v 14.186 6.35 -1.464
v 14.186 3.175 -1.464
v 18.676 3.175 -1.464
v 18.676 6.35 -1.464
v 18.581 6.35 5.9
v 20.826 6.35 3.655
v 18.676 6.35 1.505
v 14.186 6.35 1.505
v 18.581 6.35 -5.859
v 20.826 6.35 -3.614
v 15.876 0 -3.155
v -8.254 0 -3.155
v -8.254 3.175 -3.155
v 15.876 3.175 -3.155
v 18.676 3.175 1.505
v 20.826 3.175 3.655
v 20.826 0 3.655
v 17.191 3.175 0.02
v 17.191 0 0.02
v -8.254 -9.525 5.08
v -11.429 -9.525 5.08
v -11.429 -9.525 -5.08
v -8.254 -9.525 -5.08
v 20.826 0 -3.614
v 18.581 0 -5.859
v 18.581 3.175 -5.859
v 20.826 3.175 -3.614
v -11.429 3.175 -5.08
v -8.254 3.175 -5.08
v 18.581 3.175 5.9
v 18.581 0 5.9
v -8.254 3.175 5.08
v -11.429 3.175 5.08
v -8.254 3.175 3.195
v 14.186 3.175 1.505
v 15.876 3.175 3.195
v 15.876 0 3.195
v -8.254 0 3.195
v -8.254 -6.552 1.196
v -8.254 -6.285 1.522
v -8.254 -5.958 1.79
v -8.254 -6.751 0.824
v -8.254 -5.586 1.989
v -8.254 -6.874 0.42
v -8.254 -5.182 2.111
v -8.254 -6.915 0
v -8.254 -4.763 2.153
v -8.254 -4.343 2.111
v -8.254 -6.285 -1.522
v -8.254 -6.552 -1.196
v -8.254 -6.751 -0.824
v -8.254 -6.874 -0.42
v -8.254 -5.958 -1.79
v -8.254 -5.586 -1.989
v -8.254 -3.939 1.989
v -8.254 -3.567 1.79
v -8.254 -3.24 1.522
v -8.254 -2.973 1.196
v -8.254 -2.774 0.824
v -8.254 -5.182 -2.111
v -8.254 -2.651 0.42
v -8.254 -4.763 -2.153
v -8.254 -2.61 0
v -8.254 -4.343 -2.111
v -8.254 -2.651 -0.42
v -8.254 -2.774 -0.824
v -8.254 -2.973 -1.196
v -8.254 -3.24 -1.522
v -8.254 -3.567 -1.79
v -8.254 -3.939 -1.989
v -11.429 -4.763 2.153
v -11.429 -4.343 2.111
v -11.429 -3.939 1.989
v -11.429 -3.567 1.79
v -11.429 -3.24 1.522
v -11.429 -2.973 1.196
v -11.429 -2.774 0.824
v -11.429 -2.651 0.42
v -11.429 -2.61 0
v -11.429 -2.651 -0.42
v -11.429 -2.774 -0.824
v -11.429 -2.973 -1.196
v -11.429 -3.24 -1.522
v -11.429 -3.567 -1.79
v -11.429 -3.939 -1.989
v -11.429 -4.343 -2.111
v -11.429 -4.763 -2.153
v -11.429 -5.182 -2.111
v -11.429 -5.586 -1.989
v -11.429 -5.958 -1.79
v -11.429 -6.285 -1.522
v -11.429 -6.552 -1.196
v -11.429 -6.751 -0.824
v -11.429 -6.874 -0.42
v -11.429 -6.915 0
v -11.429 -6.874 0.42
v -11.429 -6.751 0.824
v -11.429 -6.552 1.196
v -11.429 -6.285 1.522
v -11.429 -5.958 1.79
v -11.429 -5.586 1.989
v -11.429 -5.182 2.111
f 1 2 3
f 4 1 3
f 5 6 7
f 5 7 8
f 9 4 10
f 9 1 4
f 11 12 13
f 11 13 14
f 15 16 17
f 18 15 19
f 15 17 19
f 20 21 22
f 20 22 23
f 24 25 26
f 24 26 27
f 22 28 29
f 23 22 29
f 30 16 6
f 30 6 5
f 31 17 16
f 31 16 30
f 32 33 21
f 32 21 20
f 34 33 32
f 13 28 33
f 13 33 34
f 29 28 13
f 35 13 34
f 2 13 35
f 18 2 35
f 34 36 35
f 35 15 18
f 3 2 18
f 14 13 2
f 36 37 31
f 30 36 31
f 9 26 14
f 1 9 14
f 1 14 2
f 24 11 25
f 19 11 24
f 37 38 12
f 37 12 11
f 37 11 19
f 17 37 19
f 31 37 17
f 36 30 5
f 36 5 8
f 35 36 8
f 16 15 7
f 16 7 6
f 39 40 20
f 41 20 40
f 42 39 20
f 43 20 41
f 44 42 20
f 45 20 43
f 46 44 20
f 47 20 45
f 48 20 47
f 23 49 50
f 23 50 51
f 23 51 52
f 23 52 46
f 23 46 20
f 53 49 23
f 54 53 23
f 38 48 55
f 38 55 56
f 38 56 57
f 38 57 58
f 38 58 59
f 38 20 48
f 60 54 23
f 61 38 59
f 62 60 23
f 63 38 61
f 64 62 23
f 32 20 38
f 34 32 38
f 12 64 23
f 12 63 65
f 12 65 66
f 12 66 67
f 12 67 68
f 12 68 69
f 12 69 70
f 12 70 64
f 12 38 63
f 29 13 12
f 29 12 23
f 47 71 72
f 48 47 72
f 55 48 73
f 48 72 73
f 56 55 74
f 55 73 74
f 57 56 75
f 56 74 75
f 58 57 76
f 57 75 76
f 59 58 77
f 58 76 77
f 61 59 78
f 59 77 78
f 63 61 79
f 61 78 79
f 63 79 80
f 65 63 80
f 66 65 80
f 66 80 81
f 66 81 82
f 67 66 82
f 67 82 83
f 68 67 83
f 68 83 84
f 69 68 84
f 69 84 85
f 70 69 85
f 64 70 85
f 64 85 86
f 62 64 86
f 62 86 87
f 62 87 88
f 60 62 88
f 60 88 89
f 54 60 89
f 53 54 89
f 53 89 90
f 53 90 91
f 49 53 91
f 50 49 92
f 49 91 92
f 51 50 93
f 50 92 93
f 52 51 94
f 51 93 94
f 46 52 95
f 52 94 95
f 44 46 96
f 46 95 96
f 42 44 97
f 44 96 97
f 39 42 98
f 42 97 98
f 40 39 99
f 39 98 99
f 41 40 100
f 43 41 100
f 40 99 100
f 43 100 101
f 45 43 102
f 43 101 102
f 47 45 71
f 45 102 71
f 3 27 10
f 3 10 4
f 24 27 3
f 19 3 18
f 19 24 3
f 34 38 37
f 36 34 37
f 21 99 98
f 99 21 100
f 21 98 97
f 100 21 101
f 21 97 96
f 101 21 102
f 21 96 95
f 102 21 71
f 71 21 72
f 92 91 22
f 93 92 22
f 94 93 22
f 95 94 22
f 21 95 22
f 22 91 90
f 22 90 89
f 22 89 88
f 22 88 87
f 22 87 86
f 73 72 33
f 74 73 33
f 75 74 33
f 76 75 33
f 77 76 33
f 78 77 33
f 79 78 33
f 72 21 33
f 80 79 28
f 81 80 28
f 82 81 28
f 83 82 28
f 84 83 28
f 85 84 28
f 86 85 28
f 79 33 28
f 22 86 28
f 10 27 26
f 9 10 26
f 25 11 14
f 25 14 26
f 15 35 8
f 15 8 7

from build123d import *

# Parameters (mm, degrees)
BOSS_EXTRUDE1_DEPTH          = 3.175
BOSS_EXTRUDE2_DEPTH          = 3.175
SKETCH3_W                    = 3.175
SKETCH3_H                    = 10.16
BOSS_EXTRUDE3_DEPTH          = 12.7
F_18_0_1695_DIAMETER_HOLE1_D = 4.3053


with BuildPart() as part:
    # Sketch1 → Boss-Extrude1 (new body)
    with BuildSketch(Plane(origin=(0, 0, 0), x_dir=(1, 0, 0), z_dir=(0, 1, 0))):
        Polygon((20.825839478, -3.654842125), (17.191471303, -0.02047395), (-11.428656758, -0.02047395), (-11.428656758, -3.19547395), (15.876343242, -3.19547395), (18.580775448, -5.899906155), align=None)
    boss_extrude1 = extrude(amount=BOSS_EXTRUDE1_DEPTH)

    # Mirror1: Boss-Extrude1 across plane
    add(boss_extrude1.mirror(Plane(origin=(-11.428656758, 3.175, 0.02047395), x_dir=(1, 0, 0), z_dir=(0, 0, 1))))

    # Sketch2 → Boss-Extrude2 (add)
    with BuildSketch(Plane(origin=(0, 3.175, 0), x_dir=(1, 0, 0), z_dir=(0, 1, 0))):
        Polygon((18.580775448, -5.899906155), (14.18553725, -1.504667957), (18.675665311, -1.504667957), (20.825839478, -3.654842125), align=None)
        Polygon((18.675665311, 1.463720058), (20.825839478, 3.613894225), (18.580775448, 5.858958256), (14.18553725, 1.463720058), align=None)
    extrude(amount=BOSS_EXTRUDE2_DEPTH)

    # Sketch3 → Boss-Extrude3 (add)
    with BuildSketch(Plane(origin=(0, 3.175, 0), x_dir=(1, 0, 0), z_dir=(0, 1, 0))):
        with Locations((-9.841156758, 0)):
            Rectangle(SKETCH3_W, SKETCH3_H)
    extrude(amount=-BOSS_EXTRUDE3_DEPTH)

    # #18 (0.1695) Diameter Hole1 (through all)
    with Locations(Plane(origin=(-8.253656758, 0, 0), x_dir=(0, 0, -1), z_dir=(1, 0, 0))):
        with Locations((0, -4.7625)):
            Hole(F_18_0_1695_DIAMETER_HOLE1_D / 2)


solid = part.part
